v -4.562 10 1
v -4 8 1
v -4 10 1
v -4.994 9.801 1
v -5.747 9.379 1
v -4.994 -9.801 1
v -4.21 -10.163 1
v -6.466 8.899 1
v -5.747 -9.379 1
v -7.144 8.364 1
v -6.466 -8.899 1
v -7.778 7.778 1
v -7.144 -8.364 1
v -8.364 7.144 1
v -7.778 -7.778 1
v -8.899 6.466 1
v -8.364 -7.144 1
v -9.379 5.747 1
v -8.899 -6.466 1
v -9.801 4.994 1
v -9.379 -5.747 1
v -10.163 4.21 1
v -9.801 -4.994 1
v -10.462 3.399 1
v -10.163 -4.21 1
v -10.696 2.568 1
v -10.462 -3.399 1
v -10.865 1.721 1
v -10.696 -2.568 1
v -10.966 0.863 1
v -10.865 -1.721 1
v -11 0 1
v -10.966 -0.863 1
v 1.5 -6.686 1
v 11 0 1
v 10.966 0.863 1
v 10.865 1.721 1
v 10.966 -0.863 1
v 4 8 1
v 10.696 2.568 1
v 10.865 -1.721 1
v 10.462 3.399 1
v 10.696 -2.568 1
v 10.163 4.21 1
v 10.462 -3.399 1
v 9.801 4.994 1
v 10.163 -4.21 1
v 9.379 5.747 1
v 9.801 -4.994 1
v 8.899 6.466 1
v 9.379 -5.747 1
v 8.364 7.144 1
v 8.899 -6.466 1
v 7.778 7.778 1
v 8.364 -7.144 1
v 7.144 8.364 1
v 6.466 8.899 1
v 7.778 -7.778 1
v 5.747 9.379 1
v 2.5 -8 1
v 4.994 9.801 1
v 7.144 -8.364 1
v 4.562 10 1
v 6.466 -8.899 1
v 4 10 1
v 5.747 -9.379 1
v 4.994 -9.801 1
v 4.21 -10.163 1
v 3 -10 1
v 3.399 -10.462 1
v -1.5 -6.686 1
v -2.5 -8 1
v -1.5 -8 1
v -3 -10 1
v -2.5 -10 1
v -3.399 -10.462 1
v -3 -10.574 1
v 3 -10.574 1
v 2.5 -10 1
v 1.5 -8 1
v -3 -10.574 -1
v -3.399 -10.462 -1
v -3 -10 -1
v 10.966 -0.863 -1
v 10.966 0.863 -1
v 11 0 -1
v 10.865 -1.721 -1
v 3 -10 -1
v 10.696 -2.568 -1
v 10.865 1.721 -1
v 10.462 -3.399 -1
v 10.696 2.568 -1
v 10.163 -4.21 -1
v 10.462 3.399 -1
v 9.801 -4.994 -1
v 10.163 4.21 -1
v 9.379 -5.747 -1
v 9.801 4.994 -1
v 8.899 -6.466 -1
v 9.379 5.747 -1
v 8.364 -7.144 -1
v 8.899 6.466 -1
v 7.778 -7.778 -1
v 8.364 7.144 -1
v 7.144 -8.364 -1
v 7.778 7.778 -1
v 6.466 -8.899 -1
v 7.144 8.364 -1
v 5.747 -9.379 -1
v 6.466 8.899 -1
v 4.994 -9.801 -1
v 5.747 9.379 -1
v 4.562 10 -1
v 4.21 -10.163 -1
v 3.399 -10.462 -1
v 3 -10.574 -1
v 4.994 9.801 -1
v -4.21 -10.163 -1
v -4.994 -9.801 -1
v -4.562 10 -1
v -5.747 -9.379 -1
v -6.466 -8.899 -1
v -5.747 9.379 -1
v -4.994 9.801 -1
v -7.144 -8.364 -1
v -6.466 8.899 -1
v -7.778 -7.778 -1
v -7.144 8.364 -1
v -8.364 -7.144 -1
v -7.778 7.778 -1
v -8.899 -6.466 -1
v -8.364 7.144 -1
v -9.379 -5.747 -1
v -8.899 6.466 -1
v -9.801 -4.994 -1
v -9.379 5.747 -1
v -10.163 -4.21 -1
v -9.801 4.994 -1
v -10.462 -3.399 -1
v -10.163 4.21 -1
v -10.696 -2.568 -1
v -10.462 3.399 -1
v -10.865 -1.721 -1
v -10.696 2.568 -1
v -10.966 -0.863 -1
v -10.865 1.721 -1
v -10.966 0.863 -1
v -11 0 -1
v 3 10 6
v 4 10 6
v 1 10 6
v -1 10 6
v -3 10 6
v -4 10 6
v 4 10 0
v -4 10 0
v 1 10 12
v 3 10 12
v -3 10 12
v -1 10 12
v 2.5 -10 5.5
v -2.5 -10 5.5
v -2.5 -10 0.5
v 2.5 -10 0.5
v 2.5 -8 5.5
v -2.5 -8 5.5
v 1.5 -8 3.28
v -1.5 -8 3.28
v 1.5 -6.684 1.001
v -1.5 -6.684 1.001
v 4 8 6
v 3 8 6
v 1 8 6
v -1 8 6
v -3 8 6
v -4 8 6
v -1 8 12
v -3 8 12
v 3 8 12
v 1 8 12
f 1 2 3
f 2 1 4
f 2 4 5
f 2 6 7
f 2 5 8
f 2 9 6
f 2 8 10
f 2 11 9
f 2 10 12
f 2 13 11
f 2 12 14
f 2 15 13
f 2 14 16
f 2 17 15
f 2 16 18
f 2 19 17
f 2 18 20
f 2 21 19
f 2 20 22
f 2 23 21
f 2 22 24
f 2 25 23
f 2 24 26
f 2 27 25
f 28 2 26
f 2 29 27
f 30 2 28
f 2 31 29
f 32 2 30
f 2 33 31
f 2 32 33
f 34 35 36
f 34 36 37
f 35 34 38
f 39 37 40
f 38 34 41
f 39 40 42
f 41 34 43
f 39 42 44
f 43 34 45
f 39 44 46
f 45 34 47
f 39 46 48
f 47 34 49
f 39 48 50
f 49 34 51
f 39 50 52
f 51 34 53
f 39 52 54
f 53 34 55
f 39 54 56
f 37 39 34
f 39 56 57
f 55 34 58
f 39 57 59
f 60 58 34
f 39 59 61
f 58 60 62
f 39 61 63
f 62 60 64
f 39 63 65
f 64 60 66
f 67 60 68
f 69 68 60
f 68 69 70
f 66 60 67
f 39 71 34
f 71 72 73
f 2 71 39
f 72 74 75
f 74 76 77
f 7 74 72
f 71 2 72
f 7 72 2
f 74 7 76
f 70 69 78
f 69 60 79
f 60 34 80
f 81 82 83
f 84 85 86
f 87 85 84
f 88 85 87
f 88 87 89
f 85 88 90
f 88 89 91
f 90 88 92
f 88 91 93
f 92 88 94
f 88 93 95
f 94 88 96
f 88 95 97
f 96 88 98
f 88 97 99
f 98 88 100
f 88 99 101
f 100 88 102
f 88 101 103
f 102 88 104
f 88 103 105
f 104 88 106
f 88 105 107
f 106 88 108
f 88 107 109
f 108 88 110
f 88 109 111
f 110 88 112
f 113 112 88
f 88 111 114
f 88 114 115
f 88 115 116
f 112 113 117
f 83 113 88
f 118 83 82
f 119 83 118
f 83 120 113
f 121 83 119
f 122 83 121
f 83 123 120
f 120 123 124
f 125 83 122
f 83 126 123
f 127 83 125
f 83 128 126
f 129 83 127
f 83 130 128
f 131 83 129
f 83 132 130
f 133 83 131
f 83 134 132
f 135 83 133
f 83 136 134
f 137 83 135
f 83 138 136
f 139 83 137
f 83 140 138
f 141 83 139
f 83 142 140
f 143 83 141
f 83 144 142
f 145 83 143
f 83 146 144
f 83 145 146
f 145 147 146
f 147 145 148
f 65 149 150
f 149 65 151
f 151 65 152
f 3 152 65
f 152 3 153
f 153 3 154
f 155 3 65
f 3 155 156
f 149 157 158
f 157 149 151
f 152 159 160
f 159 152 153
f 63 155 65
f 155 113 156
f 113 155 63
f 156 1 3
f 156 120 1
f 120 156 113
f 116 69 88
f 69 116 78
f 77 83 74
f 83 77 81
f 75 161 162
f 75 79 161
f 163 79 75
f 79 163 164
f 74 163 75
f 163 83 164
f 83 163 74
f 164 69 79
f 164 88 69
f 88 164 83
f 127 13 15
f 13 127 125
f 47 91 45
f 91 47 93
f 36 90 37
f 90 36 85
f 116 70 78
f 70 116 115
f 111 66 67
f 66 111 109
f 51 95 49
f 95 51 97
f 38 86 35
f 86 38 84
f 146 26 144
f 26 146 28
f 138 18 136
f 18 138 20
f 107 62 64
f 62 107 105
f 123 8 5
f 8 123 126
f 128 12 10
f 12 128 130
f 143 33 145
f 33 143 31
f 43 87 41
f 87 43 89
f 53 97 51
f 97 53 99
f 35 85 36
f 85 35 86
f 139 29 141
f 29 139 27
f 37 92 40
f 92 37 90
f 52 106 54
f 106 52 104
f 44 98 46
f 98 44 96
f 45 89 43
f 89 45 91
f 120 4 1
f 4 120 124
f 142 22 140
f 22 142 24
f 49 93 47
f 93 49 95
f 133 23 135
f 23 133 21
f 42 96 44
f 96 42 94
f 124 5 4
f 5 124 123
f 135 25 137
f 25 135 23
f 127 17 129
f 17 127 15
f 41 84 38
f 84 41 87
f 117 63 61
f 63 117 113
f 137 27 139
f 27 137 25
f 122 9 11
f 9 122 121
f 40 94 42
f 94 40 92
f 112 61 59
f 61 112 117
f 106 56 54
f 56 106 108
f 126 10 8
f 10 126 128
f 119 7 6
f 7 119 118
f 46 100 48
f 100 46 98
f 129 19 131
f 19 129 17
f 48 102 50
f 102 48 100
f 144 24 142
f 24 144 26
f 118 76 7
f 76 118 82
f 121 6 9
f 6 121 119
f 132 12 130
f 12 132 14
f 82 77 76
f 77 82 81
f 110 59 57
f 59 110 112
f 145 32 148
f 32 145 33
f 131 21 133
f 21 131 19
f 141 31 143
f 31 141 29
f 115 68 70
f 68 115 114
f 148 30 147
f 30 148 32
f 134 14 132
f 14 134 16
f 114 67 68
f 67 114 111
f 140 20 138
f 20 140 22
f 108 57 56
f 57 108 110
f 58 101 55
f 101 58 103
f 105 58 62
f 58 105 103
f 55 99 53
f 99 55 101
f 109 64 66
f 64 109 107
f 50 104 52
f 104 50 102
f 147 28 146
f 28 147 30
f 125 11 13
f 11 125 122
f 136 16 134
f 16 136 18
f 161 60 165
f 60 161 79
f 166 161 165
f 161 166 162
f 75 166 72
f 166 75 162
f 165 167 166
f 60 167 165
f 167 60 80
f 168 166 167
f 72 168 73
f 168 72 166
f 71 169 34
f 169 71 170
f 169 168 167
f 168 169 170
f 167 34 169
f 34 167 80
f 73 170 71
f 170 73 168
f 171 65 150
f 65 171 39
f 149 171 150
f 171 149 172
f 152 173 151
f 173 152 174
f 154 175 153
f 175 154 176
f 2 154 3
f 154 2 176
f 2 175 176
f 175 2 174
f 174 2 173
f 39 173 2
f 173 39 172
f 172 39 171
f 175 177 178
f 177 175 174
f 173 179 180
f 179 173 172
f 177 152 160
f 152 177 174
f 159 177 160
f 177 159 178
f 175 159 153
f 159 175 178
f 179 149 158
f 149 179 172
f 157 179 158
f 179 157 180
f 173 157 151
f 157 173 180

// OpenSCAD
// krytka šroubu pod klikou na přednich dveřích Chrysler 300C

$fn=80;

module small_hook(){
    color("Green") cube([5,2,5],center=true);
    color("Green") translate([0,0.7,-1.2]) rotate([30,0,0]) cube([3,2,3],center=true);
    }//module

module big_hook(){
    union(){
    color("Green") cube([8,2,6],center=true);
    color("Green") translate([-2,0,6]) cube([2,2,6],center=true);
    color("Green") translate([+2,0,6]) cube([2,2,6],center=true);
        
        }//union
    }//module

module base(){
    
    difference(){
        color("Blue") cylinder(h=2, d=22, center=true);
        union(){
            color("Red")translate([0,11,0]) cube([10,2,2],center=true);
            color("Red")translate([0,-11,0]) cube([6,2,2],center=true);
            }//union
        }//difference
    }//module
    
module part(){
    translate([0,0,0]) base();
    translate([0,-9,3]) mirror([0,0,0]) small_hook();
    translate([0,+9,3]) mirror([0,0,0]) big_hook();
    
    }//module
    
    part();
